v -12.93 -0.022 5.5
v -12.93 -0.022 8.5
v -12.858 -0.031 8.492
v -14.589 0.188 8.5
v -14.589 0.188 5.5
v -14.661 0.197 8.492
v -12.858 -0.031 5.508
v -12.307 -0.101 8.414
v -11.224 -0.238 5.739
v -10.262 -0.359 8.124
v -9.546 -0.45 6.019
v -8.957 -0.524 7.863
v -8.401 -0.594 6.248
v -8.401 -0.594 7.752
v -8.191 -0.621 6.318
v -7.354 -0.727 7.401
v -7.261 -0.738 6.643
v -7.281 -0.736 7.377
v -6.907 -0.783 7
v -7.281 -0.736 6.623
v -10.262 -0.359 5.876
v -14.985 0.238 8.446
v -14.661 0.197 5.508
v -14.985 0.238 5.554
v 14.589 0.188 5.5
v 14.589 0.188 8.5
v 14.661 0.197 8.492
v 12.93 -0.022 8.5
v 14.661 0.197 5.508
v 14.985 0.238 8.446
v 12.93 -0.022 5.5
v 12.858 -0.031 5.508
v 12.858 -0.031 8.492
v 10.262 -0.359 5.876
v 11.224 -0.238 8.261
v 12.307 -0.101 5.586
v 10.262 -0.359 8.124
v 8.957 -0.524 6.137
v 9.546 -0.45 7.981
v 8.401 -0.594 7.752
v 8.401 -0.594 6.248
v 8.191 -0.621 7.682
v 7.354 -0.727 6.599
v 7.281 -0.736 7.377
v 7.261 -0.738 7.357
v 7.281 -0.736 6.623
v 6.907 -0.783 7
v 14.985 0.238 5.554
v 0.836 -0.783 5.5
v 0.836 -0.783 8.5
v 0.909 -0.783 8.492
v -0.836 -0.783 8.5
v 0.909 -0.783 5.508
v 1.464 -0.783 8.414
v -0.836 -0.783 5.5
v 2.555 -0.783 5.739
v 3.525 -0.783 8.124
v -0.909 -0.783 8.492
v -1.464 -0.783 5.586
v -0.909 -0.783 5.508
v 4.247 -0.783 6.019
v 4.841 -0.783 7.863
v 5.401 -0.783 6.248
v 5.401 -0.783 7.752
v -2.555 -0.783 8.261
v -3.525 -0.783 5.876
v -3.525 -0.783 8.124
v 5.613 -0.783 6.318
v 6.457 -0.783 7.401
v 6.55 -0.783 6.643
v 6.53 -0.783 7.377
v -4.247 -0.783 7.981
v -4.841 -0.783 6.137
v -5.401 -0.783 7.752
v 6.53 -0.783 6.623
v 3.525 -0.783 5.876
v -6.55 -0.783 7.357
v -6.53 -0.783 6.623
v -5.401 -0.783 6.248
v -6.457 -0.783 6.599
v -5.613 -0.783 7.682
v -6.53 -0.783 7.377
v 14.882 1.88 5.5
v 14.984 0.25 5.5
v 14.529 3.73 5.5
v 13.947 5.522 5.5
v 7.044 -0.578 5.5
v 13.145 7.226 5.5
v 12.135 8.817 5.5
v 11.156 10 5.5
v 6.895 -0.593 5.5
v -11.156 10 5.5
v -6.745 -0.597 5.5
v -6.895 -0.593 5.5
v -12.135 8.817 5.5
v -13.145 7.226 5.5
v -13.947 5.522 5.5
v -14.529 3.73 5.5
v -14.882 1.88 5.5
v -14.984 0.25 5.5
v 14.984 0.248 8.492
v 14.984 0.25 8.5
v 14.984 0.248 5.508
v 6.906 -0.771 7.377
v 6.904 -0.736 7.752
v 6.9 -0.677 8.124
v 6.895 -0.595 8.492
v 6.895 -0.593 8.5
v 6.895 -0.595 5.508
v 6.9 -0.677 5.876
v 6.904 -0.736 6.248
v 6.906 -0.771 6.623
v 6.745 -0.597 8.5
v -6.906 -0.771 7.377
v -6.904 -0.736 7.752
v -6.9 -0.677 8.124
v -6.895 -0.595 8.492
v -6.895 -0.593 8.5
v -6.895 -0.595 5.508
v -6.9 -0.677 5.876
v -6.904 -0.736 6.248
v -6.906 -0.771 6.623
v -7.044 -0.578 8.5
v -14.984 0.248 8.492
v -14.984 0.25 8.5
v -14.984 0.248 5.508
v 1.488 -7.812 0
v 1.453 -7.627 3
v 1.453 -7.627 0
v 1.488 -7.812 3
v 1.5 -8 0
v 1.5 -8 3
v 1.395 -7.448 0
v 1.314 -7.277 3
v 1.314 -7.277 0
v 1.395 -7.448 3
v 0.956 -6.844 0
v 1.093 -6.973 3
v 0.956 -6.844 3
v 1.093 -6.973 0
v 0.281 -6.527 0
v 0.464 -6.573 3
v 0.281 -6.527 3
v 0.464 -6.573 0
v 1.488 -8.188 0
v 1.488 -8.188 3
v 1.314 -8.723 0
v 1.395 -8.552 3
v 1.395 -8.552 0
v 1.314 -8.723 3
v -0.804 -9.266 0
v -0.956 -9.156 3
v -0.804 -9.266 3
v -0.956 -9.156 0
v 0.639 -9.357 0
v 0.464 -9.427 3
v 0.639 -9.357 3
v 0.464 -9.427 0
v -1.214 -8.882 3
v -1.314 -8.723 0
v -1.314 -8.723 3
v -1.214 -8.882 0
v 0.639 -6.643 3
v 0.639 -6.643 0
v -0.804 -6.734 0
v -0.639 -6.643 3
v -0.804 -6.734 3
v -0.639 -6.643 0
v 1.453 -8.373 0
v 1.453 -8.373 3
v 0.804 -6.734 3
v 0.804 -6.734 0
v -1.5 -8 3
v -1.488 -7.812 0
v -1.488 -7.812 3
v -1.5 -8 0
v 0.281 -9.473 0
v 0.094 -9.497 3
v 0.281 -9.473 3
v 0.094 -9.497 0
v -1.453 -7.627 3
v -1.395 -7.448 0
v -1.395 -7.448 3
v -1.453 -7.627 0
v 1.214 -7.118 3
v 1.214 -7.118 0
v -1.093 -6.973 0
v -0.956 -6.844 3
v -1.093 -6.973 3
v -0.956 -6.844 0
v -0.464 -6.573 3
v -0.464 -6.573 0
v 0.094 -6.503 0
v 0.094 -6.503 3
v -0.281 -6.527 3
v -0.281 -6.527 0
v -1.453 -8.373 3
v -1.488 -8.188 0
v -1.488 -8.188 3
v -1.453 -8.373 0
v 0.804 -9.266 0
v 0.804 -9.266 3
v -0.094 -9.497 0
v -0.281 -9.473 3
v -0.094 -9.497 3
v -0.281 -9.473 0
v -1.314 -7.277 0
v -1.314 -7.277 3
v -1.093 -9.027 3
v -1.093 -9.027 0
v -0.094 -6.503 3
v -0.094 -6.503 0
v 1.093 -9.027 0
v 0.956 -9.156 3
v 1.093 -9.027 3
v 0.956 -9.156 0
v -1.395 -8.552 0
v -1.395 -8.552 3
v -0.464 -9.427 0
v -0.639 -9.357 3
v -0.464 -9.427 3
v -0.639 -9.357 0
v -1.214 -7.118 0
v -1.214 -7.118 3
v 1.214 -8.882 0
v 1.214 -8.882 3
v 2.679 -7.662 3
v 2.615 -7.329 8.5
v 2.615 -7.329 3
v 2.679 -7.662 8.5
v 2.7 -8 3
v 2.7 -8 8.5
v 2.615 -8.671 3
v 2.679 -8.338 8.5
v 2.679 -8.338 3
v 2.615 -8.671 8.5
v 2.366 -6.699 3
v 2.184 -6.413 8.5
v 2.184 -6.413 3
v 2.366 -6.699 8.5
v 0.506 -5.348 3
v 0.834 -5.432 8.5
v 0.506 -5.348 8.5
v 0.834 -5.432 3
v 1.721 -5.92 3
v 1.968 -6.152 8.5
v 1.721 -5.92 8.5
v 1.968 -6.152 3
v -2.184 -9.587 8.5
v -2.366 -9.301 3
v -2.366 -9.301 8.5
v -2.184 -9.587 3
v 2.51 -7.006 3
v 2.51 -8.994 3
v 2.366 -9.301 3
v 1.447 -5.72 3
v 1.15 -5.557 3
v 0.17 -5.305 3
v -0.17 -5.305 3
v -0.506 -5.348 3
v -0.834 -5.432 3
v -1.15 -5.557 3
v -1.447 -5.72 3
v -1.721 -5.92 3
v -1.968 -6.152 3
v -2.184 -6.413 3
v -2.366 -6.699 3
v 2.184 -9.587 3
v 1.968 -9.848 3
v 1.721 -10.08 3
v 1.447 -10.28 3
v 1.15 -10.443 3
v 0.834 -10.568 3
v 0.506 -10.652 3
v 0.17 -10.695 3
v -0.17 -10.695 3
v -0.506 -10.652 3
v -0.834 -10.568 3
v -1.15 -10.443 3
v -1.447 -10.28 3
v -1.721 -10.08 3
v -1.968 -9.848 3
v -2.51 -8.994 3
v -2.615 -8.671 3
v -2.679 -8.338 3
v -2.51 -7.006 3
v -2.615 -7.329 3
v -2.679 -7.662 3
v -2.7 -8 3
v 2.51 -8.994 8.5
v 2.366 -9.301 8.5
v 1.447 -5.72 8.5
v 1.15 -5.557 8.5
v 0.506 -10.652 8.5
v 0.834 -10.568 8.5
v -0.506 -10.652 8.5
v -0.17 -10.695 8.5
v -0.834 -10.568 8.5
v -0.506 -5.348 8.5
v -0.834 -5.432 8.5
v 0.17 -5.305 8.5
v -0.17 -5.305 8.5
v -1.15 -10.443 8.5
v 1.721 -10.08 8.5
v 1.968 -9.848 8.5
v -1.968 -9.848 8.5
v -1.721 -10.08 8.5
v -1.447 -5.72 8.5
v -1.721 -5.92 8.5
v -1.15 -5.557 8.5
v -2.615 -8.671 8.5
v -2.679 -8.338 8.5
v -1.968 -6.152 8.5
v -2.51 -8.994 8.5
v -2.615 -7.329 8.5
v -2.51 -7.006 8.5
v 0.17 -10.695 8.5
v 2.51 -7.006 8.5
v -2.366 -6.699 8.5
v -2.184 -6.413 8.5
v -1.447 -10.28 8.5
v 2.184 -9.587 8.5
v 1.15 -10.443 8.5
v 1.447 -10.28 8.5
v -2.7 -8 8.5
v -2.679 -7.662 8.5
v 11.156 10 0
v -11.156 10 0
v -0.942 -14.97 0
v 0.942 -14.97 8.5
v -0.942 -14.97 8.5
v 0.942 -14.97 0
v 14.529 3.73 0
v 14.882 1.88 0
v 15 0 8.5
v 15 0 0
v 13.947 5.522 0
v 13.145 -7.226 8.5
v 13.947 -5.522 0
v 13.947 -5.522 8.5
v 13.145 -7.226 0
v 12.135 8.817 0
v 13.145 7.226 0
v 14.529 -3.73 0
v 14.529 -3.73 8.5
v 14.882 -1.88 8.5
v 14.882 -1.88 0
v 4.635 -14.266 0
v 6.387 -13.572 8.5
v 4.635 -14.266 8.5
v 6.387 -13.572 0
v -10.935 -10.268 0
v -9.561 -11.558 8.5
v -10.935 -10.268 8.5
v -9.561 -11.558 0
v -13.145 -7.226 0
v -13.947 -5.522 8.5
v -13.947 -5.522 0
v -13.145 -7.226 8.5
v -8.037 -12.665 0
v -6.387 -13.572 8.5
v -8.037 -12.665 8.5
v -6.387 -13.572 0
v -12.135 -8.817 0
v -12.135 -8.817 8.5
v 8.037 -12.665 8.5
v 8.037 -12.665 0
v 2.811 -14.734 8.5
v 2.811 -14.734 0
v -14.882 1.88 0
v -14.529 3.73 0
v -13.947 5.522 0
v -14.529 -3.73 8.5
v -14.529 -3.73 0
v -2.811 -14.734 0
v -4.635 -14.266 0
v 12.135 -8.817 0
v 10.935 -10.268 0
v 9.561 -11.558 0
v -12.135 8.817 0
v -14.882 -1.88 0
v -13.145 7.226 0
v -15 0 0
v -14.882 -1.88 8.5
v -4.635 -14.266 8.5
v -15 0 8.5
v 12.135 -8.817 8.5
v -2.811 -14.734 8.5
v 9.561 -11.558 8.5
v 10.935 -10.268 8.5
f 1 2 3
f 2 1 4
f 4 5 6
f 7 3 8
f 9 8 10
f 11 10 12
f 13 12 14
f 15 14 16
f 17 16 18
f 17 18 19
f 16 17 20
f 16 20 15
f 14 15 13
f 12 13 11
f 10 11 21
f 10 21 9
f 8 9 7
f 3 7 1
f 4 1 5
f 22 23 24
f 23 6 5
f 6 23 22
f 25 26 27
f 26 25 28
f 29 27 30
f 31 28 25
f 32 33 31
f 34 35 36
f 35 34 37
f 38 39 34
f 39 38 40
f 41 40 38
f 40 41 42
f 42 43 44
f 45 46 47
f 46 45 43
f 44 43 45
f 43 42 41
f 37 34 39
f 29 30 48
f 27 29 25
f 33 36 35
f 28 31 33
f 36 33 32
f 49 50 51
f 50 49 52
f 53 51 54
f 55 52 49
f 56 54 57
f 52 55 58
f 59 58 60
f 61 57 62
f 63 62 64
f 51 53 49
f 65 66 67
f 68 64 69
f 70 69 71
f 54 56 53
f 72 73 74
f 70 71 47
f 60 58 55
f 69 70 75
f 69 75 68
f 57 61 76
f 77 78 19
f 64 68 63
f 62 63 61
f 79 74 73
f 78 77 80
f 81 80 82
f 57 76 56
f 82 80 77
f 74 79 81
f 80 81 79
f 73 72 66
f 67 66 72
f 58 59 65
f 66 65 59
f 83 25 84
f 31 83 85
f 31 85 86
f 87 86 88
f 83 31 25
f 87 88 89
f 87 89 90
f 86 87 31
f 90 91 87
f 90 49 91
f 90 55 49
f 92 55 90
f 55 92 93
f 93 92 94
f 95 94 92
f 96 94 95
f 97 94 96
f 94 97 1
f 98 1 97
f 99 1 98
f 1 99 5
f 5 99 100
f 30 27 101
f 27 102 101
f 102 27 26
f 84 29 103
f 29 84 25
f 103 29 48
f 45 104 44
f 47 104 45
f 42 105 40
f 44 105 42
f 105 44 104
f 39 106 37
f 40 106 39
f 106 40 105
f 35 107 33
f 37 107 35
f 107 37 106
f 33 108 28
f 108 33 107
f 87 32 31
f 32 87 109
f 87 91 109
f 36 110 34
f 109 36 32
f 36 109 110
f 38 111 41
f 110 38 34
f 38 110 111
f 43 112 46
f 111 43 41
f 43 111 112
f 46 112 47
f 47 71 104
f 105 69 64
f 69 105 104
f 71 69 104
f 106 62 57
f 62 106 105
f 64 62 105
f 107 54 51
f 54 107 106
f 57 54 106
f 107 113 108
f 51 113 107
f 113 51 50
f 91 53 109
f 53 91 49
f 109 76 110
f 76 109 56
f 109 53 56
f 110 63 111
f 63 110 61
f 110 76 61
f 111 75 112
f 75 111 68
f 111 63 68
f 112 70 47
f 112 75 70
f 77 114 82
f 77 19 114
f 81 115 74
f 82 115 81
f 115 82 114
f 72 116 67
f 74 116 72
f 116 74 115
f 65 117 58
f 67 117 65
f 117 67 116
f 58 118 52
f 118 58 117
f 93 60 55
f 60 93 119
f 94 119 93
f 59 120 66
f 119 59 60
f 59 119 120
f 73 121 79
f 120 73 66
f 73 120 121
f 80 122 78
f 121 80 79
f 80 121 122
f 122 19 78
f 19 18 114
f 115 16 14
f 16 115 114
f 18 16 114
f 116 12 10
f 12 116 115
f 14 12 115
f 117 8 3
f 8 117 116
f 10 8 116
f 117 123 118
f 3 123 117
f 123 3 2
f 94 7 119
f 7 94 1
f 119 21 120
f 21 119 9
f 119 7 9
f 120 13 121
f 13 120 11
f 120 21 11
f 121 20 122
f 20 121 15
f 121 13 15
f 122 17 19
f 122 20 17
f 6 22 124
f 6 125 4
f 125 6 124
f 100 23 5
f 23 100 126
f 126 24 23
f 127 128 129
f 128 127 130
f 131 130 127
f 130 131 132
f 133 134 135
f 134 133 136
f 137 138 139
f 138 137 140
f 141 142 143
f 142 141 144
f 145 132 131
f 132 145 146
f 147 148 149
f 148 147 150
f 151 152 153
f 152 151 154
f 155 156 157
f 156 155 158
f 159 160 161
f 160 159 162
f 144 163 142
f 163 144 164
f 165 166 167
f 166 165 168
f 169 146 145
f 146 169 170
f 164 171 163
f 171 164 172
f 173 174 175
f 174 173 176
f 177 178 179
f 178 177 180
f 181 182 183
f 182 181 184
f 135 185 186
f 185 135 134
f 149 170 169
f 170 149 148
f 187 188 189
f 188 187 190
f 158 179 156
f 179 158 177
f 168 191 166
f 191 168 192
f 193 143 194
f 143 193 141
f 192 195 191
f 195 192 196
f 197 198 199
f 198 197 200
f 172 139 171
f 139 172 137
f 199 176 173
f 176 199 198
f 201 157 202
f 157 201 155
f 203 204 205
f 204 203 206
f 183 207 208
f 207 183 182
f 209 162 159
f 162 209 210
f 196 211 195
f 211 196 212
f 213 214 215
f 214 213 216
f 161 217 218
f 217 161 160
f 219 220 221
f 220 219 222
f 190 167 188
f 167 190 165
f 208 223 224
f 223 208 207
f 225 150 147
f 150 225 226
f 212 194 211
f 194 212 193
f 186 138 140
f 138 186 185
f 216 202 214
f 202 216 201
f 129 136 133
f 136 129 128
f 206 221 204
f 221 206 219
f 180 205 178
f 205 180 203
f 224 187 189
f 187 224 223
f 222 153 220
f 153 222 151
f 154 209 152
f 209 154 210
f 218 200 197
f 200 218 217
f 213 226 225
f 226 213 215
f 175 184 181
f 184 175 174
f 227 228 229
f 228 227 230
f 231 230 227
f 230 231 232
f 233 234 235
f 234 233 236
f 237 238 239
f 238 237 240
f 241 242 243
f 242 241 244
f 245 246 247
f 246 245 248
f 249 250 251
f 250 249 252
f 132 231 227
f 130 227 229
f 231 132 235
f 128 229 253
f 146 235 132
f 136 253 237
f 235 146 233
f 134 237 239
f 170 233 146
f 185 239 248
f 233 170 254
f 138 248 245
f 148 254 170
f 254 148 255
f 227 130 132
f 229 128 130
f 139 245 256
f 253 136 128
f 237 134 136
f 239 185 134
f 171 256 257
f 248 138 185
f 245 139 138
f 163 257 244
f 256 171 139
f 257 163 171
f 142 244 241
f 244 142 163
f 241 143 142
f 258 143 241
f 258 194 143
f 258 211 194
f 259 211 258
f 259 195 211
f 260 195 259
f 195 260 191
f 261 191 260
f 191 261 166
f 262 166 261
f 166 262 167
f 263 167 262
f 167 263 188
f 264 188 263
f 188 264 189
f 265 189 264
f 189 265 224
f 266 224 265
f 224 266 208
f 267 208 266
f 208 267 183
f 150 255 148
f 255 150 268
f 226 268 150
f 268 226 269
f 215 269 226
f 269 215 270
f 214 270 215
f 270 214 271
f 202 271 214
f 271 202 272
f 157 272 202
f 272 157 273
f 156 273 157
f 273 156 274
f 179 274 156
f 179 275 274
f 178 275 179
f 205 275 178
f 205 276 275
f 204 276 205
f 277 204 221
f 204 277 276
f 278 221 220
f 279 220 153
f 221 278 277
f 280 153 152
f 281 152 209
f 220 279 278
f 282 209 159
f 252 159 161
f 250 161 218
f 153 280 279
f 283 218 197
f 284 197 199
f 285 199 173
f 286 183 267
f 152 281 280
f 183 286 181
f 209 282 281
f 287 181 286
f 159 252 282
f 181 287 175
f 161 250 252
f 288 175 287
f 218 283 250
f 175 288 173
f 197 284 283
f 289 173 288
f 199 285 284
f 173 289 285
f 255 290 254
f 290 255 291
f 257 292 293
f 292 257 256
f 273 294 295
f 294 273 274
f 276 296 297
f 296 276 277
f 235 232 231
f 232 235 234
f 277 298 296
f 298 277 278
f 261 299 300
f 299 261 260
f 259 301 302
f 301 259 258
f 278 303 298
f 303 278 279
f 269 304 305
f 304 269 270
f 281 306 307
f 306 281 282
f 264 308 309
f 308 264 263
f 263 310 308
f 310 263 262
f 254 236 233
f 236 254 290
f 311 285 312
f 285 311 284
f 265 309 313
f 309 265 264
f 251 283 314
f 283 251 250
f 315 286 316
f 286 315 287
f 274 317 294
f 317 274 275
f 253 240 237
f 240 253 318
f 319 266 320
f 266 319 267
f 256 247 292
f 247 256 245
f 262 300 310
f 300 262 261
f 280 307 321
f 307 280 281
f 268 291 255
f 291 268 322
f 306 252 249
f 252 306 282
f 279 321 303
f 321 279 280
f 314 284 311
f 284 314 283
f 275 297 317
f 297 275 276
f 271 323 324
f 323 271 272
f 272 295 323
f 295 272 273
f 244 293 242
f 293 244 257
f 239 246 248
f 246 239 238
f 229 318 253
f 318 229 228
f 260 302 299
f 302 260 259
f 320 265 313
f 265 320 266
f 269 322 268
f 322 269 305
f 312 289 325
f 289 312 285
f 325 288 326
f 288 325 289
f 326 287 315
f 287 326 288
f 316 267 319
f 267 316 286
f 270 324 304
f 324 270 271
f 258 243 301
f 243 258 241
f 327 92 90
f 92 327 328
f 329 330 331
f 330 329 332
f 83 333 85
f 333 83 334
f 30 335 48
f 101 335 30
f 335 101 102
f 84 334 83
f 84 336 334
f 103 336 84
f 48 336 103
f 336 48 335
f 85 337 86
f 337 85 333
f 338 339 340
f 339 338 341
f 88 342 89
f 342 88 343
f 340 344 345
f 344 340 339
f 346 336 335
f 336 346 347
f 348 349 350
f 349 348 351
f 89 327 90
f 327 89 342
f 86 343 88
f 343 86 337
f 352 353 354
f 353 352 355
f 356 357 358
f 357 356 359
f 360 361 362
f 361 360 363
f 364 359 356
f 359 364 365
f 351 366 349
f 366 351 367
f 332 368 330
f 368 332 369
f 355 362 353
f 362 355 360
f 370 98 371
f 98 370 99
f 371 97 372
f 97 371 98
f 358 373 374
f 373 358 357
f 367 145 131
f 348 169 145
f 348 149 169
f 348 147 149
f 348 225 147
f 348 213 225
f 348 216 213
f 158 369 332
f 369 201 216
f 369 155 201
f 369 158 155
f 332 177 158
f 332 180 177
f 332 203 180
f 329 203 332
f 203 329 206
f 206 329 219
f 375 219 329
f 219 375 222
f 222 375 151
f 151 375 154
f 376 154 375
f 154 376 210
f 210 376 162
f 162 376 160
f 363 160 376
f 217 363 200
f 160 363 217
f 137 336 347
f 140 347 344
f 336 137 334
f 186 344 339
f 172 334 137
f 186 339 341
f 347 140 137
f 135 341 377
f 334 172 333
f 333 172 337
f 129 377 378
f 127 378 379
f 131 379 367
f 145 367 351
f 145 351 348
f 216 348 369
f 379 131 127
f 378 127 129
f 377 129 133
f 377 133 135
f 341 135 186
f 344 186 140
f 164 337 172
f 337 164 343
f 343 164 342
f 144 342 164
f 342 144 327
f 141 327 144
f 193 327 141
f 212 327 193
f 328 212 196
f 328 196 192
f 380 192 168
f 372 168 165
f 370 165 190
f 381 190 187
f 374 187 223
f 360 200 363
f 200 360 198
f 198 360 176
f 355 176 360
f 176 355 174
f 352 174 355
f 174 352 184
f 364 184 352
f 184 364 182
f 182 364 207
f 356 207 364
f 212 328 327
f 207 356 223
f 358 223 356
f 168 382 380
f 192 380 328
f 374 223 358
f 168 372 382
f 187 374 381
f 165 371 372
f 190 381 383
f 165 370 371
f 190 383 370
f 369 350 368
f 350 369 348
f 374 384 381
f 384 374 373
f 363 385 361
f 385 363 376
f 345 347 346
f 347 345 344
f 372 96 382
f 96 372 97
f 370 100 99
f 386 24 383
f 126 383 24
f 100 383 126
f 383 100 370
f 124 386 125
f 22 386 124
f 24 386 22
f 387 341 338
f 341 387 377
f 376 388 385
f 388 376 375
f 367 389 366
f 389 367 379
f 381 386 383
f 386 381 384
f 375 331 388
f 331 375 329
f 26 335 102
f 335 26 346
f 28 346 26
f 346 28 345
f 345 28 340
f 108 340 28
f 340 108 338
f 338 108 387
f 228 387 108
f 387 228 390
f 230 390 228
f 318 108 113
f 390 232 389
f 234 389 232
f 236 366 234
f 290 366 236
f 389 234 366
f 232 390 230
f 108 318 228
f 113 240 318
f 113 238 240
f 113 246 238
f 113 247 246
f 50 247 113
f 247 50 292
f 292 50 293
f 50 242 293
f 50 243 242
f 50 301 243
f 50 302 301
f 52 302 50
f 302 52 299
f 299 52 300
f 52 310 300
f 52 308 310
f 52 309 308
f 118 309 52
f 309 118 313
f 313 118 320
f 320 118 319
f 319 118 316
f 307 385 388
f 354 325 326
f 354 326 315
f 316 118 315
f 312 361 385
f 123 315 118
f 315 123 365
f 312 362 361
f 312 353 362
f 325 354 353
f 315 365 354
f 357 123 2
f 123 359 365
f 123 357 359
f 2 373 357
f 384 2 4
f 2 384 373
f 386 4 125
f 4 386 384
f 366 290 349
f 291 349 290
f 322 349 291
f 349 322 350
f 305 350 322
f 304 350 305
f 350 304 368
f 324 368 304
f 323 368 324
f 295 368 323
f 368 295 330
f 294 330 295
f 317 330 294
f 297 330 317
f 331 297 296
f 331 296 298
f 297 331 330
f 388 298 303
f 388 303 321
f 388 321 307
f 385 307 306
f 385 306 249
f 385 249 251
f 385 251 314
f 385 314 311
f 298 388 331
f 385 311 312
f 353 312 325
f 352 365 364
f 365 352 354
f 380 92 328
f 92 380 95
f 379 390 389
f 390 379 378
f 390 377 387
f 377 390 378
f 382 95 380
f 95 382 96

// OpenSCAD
$fn=50;

// diameter of holder in mm
DIAMETER = 30;

// height of glass bed in mm
BED_THICKNESS = 3;

// distance between openbeam bar to bed lower corner in mm
OPENBEAM_TO_BED_DIST = 5.5;

// diameter of bed in mm
BED_DIAMETER = 220;

// length of part holding the bed in mm, this does not include the part with
// the screw
HOLDER_LENGTH = 16;

//
HOLDER_CUT_OFF = 5;

// diameter sinking for screw
SCREW_HEAD_DIAMETER = 5.4;

// diameter of screw
SCREW_DIAMETER = 3;

// length of hole for screw in mm
SCREW_LENGTH = 3;

// position of screw hole in mm, distance to outer edge
SCREW_POS = (DIAMETER - HOLDER_LENGTH)/2.;

ROUND_BED_EDGE = true;

// radius of roundness in mm, smaller number more round
BED_ROUNDNESS = 6;

/* * * * * * * * * * * * * * * * * * * * * * * * * */

tot_height = OPENBEAM_TO_BED_DIST + BED_THICKNESS;

difference() {
    cylinder(d=DIAMETER, h=tot_height);
    union() {
        // this is the bed
        translate([0.,
                   -HOLDER_LENGTH + BED_DIAMETER/2. + DIAMETER / 2.,
                   OPENBEAM_TO_BED_DIST])
        {
            union() {
                intersection() {
                    cylinder(d=BED_DIAMETER, h=BED_THICKNESS*2);
                    if (ROUND_BED_EDGE) {
                        translate([0., 0., BED_THICKNESS/2.])
                            rotate_extrude(convexity = 10, $fn = 100)
                                translate([BED_DIAMETER/2. - BED_ROUNDNESS, 0, 0]) {
                                    circle(r = BED_ROUNDNESS, $fn = 100);
                                }
                    }
                }
                cylinder(d=BED_DIAMETER-BED_ROUNDNESS, h=BED_THICKNESS*2);
            }
        }

        translate([0., -DIAMETER/2. + SCREW_POS, ]) {
            // this is the screw
            translate([0., 0., -tot_height/4.])
                cylinder(d=SCREW_DIAMETER, h=tot_height*2);

            // screw head
            translate([0., 0., SCREW_LENGTH])
                cylinder(d=SCREW_HEAD_DIAMETER, h=tot_height);
        }

        // cut off
        translate([0., DIAMETER - HOLDER_CUT_OFF, tot_height * 3./4.])
            cube([DIAMETER, DIAMETER, 2*tot_height], center=true);
    }
}
